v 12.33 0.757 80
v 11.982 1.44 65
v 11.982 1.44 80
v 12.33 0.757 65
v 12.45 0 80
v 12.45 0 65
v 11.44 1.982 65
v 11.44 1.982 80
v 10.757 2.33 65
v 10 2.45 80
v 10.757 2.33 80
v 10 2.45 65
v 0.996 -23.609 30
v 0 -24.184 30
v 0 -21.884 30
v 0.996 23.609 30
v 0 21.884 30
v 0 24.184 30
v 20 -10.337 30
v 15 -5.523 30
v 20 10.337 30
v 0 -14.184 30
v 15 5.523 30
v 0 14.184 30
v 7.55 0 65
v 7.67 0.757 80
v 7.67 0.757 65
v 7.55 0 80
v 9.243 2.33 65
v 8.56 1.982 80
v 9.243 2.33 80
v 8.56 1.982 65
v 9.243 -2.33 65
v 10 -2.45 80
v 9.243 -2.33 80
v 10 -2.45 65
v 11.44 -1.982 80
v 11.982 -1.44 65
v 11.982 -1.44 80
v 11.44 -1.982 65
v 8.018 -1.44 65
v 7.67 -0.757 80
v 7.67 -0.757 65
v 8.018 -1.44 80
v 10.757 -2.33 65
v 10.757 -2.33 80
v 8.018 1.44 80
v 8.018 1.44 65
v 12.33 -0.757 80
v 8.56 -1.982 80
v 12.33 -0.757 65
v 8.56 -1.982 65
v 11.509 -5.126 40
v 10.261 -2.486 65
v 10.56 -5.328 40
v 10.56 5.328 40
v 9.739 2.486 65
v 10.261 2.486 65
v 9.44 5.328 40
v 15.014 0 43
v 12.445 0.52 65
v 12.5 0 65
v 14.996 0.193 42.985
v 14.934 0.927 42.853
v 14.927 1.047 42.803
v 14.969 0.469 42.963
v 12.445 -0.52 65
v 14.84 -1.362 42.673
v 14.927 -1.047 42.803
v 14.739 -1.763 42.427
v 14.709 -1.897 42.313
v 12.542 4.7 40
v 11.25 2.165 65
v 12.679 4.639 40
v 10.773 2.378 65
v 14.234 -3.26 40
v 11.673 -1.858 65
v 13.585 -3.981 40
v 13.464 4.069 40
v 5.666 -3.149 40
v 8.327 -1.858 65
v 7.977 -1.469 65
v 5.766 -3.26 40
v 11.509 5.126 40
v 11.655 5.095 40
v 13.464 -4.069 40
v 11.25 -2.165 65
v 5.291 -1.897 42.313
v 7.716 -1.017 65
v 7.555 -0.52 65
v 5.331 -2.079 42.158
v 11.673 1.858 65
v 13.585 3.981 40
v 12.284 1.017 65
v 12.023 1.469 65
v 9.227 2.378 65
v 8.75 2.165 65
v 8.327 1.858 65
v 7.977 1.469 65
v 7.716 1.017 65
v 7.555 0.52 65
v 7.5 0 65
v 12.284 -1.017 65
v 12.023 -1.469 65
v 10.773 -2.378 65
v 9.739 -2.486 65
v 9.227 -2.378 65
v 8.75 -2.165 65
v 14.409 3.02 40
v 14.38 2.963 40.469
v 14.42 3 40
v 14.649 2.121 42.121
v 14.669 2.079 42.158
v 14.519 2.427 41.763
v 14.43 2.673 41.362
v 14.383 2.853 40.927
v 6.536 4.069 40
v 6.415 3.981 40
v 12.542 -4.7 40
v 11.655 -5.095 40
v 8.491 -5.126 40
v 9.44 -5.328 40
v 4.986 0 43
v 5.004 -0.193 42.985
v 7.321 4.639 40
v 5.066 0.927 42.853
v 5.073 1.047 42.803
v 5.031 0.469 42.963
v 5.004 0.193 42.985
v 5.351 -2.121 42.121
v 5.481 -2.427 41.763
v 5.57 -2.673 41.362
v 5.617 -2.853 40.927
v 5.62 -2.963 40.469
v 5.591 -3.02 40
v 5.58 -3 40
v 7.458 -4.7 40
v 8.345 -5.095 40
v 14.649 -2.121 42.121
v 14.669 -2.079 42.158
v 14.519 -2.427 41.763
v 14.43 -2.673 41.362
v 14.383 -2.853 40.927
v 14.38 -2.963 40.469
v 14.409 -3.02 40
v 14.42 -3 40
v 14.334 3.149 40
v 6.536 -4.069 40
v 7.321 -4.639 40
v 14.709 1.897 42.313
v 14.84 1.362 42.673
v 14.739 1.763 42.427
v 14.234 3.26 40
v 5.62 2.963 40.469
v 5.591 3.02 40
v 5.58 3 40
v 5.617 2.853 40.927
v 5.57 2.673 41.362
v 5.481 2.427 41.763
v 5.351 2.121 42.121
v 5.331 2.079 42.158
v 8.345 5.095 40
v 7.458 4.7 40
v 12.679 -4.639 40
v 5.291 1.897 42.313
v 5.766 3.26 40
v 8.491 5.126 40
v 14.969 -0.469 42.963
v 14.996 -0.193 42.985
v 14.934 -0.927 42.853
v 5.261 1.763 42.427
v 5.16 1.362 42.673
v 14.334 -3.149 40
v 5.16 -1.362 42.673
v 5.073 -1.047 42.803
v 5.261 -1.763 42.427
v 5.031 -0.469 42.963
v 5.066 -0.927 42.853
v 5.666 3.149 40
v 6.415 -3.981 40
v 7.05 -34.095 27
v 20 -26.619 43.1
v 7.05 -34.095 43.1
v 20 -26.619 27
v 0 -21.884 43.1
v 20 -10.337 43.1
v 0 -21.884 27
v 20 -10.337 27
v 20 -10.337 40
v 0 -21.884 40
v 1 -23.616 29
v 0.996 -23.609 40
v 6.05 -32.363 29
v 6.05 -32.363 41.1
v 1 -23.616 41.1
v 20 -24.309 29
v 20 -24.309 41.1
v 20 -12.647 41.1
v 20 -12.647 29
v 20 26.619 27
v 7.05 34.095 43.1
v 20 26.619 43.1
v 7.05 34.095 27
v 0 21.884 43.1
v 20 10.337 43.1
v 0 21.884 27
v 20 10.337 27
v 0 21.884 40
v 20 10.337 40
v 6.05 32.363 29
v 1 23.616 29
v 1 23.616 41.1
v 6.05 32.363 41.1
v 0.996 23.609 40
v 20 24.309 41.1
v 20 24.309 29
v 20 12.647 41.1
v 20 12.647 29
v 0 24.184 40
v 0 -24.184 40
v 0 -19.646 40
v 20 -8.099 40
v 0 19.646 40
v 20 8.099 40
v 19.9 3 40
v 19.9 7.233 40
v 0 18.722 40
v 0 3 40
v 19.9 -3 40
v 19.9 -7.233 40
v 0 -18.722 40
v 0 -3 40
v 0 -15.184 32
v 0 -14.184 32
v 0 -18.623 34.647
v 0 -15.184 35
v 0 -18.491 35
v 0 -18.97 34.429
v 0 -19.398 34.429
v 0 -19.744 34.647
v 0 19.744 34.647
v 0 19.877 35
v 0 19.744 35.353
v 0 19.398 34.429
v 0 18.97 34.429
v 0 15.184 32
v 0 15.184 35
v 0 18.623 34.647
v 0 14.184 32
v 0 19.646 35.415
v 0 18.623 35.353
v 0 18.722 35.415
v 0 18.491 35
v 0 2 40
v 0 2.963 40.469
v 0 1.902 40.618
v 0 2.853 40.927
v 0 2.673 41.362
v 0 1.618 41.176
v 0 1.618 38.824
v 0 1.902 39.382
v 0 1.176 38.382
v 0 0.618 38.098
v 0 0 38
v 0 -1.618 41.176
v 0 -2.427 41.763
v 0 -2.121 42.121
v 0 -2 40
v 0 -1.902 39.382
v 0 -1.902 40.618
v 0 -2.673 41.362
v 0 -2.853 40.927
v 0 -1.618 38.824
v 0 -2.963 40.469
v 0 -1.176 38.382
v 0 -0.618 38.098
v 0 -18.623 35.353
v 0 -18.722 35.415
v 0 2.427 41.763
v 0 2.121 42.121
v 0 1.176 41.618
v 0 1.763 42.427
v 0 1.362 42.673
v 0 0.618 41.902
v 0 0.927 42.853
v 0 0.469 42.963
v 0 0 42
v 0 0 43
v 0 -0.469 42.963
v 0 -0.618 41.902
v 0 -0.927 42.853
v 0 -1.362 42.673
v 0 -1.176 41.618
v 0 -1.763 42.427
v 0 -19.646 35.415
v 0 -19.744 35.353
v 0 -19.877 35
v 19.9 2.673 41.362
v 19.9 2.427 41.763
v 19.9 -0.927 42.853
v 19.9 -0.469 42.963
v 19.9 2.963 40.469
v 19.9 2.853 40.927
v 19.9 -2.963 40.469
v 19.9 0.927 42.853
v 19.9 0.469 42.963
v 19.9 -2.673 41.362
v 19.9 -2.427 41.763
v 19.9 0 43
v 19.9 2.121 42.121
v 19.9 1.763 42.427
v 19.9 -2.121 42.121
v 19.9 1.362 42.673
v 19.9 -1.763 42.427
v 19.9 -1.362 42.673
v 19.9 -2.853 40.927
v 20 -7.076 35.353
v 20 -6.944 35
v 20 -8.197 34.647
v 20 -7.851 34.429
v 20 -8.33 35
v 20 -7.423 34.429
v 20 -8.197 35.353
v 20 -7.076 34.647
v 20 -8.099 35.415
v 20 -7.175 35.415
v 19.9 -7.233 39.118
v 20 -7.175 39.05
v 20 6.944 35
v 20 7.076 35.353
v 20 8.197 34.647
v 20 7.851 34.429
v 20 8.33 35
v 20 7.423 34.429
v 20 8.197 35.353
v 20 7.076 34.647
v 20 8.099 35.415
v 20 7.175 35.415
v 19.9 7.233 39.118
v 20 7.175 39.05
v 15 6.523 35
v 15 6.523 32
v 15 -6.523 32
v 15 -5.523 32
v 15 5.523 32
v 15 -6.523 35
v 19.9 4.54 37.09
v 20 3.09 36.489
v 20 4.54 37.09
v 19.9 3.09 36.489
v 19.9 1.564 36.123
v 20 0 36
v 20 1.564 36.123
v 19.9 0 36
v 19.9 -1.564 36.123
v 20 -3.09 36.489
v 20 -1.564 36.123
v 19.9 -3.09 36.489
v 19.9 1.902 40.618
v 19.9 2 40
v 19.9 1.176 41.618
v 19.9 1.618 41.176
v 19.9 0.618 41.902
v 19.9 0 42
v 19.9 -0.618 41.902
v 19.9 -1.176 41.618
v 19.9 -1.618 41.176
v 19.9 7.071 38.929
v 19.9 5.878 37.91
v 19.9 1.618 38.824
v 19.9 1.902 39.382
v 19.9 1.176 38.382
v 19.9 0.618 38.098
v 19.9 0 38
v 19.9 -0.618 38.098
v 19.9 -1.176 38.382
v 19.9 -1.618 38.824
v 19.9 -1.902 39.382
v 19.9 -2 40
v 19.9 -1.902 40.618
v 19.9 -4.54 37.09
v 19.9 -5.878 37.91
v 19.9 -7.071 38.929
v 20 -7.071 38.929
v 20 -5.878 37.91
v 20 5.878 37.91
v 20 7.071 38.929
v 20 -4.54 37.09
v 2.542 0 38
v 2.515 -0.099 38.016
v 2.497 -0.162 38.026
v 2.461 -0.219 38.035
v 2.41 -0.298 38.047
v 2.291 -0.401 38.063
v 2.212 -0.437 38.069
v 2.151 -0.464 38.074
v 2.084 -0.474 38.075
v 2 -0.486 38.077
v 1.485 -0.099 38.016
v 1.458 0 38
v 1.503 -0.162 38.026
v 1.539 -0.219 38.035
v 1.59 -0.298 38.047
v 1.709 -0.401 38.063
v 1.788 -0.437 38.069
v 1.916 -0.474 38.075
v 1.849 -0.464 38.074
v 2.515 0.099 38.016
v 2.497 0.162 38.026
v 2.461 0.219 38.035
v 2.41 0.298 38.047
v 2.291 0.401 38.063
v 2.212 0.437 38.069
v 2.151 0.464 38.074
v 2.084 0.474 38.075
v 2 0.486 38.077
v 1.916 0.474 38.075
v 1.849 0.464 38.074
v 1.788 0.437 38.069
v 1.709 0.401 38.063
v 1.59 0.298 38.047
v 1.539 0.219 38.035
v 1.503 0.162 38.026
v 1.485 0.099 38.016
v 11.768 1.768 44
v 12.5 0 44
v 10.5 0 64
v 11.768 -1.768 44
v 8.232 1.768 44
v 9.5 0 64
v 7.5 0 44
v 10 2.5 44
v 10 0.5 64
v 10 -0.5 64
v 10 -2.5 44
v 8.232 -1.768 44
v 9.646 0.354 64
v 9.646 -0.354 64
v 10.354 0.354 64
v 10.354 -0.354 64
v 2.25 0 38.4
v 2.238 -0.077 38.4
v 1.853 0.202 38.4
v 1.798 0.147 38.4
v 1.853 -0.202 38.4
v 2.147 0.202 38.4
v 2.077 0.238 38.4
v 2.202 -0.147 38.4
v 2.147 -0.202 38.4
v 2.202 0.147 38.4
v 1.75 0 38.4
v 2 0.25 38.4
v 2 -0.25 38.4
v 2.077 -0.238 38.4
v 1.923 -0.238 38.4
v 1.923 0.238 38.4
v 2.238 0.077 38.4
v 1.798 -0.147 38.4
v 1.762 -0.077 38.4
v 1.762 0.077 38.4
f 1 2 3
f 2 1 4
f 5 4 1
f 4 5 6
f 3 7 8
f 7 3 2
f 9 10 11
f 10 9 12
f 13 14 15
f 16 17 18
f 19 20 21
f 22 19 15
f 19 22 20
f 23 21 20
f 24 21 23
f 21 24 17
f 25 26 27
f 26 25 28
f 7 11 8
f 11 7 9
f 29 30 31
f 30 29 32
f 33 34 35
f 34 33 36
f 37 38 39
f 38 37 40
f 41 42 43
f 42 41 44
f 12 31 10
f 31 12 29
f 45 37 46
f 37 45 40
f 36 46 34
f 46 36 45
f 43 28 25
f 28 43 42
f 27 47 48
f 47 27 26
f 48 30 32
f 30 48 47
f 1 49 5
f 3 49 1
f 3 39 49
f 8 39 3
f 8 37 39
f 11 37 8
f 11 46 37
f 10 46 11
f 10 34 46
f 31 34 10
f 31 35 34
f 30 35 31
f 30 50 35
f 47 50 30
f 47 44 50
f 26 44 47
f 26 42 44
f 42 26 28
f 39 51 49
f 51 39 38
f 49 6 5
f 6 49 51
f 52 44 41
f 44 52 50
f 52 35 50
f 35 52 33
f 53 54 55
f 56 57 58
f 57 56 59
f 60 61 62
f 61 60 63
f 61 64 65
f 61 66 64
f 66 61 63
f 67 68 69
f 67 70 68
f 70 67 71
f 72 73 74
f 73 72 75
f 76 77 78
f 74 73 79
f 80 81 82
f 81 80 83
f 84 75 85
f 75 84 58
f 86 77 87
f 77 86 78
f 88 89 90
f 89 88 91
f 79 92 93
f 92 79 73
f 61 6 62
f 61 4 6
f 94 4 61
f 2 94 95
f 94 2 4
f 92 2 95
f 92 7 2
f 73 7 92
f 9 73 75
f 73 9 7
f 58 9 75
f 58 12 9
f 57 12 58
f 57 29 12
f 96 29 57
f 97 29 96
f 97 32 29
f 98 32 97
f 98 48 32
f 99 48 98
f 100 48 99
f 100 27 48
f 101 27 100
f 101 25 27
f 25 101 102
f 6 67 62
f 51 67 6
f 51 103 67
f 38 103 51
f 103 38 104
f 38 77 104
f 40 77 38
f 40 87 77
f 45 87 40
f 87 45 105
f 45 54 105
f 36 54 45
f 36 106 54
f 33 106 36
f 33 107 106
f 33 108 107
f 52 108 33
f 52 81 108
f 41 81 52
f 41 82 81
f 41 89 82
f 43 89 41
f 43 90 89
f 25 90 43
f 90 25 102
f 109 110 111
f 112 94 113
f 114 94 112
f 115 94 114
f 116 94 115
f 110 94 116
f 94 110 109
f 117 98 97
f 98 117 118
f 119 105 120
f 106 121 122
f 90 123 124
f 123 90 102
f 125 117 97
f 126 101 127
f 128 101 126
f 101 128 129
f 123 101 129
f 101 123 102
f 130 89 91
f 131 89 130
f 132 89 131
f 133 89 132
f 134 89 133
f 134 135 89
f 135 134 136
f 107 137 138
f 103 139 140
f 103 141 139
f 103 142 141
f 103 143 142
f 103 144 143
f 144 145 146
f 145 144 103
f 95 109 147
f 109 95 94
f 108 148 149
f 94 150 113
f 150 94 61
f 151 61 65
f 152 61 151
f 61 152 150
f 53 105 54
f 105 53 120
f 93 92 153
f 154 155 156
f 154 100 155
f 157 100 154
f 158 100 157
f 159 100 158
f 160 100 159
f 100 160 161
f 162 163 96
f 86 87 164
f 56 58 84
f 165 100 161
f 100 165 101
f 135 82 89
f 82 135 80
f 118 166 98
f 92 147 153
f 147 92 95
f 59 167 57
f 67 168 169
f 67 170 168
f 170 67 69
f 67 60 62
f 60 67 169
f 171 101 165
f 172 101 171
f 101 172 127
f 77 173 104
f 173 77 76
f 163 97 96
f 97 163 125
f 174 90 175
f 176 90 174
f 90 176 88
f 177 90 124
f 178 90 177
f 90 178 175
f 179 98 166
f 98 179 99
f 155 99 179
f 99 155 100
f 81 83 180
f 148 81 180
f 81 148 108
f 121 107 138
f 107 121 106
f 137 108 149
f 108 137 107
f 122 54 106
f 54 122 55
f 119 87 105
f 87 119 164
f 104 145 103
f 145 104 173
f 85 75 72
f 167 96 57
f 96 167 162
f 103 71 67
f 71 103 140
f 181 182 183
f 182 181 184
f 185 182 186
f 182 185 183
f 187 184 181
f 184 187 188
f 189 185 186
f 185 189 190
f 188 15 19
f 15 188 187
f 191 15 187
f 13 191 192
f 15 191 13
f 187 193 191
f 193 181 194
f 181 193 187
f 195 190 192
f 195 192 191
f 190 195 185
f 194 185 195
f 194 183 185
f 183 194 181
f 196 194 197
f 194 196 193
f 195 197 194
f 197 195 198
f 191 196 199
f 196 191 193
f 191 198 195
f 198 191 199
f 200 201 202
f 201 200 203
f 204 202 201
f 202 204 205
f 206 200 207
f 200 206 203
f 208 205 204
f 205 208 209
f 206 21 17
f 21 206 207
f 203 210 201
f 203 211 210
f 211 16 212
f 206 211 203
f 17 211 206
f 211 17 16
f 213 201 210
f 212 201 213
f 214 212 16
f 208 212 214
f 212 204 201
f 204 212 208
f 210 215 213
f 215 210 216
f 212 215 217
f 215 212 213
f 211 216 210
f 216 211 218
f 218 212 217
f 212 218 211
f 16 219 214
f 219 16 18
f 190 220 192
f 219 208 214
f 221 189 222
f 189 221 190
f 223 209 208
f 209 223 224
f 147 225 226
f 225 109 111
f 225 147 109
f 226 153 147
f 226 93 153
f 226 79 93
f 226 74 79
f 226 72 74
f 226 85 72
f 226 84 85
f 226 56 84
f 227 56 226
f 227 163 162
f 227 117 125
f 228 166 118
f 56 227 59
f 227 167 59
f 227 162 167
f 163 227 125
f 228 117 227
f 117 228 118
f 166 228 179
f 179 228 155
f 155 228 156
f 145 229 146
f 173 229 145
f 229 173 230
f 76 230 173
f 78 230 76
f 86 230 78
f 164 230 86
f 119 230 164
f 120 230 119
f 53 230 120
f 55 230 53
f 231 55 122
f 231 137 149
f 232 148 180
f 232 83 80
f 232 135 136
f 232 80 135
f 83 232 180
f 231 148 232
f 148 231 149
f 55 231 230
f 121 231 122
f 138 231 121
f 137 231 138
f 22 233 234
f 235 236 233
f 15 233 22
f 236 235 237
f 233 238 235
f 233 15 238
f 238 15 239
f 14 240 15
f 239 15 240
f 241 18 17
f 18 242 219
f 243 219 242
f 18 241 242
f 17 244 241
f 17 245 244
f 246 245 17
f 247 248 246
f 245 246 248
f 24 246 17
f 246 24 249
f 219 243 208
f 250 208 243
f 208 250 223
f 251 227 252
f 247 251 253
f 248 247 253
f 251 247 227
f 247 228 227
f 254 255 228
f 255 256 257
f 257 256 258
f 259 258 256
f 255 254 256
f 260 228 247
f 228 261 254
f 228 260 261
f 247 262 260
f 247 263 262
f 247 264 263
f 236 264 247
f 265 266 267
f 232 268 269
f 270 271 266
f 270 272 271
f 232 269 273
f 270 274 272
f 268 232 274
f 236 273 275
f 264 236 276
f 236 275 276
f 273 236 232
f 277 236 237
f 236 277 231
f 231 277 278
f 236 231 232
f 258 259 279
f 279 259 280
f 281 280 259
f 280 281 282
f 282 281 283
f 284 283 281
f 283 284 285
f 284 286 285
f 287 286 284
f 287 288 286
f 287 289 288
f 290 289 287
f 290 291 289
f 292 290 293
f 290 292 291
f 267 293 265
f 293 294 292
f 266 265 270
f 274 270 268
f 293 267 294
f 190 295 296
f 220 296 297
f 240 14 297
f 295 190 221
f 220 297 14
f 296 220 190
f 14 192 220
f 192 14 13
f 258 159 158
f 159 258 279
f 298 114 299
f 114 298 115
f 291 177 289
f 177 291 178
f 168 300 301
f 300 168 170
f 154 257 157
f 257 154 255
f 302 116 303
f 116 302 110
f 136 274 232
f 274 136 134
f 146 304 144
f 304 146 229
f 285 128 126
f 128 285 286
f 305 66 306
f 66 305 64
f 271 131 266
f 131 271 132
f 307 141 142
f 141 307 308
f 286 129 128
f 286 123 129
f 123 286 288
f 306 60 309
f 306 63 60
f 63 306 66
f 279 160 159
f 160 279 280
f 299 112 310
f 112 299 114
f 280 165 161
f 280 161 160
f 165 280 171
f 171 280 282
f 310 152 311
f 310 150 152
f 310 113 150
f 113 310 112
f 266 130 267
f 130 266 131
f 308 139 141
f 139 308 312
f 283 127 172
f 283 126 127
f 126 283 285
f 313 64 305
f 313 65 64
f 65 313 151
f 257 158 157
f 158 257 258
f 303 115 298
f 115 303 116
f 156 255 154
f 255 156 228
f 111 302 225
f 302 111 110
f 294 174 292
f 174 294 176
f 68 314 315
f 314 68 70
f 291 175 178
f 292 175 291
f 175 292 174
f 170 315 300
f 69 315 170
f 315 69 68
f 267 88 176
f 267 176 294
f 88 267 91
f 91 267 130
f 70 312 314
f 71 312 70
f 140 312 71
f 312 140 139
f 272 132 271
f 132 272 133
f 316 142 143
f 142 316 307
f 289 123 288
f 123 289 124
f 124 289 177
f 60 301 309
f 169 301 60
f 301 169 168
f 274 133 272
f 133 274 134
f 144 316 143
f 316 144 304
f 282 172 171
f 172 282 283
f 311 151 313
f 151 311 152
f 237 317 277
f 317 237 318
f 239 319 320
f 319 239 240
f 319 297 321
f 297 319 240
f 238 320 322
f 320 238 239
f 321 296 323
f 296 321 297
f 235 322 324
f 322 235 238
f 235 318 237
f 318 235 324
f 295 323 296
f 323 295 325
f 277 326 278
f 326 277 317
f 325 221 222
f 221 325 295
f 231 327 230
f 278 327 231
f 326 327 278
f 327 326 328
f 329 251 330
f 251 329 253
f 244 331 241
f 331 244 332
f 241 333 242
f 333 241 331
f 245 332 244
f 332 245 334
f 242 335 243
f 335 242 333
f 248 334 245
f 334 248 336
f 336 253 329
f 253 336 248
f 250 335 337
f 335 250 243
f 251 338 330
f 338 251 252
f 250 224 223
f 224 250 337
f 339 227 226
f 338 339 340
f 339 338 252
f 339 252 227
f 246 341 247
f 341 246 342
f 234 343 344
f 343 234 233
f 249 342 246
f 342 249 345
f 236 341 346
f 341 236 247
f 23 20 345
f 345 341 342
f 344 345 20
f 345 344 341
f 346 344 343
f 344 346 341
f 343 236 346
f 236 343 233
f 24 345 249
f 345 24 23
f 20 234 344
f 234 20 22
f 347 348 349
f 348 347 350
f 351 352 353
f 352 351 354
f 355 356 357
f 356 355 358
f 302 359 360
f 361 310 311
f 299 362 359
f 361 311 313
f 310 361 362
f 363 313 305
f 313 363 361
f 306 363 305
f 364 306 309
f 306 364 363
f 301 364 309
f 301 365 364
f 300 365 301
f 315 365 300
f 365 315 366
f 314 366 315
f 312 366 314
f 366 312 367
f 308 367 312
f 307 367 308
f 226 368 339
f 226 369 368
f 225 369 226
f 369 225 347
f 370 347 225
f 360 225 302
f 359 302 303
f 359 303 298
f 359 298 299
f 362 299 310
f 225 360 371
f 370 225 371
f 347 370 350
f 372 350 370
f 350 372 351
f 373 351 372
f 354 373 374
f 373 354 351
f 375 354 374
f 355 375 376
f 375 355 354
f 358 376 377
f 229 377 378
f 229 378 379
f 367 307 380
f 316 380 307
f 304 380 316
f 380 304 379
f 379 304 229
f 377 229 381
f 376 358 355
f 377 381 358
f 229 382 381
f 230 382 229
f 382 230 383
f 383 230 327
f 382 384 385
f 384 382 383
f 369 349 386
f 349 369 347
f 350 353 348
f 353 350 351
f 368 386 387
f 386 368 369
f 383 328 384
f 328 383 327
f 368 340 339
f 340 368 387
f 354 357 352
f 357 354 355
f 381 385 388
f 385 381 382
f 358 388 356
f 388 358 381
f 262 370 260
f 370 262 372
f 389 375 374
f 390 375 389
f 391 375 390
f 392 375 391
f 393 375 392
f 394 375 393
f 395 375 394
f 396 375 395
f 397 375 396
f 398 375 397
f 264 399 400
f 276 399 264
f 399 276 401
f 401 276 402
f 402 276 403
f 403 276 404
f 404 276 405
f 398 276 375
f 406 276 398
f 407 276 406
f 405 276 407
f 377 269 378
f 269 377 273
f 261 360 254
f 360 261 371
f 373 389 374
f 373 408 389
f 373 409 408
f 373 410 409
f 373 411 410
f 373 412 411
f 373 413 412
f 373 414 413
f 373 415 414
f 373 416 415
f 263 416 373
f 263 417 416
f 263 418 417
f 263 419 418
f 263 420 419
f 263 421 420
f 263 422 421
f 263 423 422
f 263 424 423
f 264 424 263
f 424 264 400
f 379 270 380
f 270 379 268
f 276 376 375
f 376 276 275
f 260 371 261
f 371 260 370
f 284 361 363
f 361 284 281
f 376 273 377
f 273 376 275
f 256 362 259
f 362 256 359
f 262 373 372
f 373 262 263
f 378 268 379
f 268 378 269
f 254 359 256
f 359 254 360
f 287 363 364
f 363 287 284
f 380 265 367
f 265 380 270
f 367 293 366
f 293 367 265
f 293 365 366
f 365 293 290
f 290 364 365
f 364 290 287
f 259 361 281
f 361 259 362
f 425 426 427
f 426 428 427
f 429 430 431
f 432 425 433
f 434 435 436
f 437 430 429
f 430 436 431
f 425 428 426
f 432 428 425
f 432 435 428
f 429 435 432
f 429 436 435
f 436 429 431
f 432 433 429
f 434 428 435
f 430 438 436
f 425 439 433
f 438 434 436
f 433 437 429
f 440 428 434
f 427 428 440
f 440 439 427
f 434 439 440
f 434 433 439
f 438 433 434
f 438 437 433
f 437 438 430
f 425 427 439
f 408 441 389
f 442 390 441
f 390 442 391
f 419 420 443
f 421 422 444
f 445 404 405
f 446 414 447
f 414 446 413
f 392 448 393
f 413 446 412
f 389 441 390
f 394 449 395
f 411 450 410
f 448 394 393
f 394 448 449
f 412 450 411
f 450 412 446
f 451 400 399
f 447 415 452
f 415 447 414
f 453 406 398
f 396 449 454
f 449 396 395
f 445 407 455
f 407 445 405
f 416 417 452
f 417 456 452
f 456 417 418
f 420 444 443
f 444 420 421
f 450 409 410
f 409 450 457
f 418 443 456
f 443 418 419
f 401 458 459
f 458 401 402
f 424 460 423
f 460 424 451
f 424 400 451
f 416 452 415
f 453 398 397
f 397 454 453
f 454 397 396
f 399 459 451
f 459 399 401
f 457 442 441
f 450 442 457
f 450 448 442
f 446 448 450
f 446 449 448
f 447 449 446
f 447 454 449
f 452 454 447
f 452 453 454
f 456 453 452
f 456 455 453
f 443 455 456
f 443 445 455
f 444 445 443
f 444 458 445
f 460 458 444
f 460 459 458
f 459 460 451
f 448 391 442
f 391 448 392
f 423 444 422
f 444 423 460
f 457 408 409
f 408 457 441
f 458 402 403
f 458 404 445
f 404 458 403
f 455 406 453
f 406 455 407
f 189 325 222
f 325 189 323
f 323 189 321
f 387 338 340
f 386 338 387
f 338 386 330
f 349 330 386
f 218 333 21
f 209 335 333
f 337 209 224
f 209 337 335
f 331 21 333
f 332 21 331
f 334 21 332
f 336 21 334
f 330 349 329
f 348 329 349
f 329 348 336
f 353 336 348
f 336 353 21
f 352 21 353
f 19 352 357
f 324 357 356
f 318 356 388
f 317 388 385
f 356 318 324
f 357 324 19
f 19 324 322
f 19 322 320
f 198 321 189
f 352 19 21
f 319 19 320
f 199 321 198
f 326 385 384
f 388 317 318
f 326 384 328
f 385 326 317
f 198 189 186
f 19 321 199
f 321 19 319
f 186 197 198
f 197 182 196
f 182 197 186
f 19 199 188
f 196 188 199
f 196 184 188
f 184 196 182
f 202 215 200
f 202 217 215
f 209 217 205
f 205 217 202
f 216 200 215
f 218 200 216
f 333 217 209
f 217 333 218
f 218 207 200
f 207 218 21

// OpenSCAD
module slidingSlot(){
	difference(){
		rotate_extrude(){
			translate([40,0,0])
			polygon(points=[[0,0],[16,0],[16,10],[11,10],[11,7],[13,4],[13,3],[3,3],[3,4],[5,7],[5,10],[0,10]]);
		}
		translate([0,0,-5])
		linear_extrude(height=20)
		polygon(points=[[60,60],[-60,60],[0,0],[-60,-60],[60,-60]]);
	}
}

module needleSlot(xx,yy,zz){
	l=55;
	translate([xx-(l-5)*cos(30)+25,yy-sin(30)*l-2.25,zz+5])
		rotate([-90,0,-60]){
			cylinder(d=1.2,h=l,$fn=10);
			translate([-0.4,-10,0])
				cube([0.8,10,l]);
	}
}

module sideMotorMount(xx,yy,zz,wideY){
	translate([xx,-wideY+(2/cos(30))-0.01,zz-3])
		rotate([0,0,-60]){
		difference(){
			cube([14.1,24,16.1]);
			translate([2,-5,2])
			cube([10.1,30,12.1]);
		}
	}
}

module signature(){
	translate([17,6,39.5])
	rotate([0,0,150])
	scale([2,2,1])
	linear_extrude(height=2)
		import(file="sig.dxf");
}


module waterNeedleHolder(xx,yy,zz){
	narrowY=2.25+sin(30)*5+5;
	wideY=narrowY+tan(30)*25;
	
	difference(){
		union(){

			//Top Scaffold Adaptor
			translate([10,0,zz]){
				cylinder(d=4.9,h=50,$fn=20);
				cylinder(d1=13,d2=5,h=35, $fn=30);
			}
		
			//Base
			translate([xx,yy,zz])
			linear_extrude(height=10)
			polygon(points=[[25,narrowY],[25,-narrowY],[0,-wideY],[0,wideY]]);

			//Odor Tube
			translate([xx,yy,zz+10])
			rotate([0,90,0])	
			cylinder(h=20,d=6,$fn=40);
			
			sideMotorMount(xx,yy,zz,wideY);
			mirror([0,1,0])
				sideMotorMount(xx,yy,zz,wideY);

		}

		signature();
		
		//Bottom Slot
		translate([xx,yy,zz+2])
		linear_extrude(height=3)
		polygon(points=[[15,tan(30)*10+narrowY-9],[15,-tan(30)*10-narrowY+9],[0,-wideY+9],[0,wideY-9]]);
		
		//Bottom Groove
		translate([xx,yy,zz-5])
		linear_extrude(height=10)
		polygon(points=[[15,tan(30)*10+narrowY-10],[15,-tan(30)*10-narrowY+10],[0,-wideY+10],[0,wideY-10]]);

		
		//Nose Groove
		translate([xx+19.9,yy,zz+16])
		rotate([0,90,0])
		cylinder(h=20,d=20,$fn=40);
		
		
		//Odor Tube
		translate([xx-15,yy,zz+10])
		rotate([0,90,0])
		cylinder(h=60,d=4,$fn=20);

		needleSlot(xx,yy,zz);
		mirror([0,1,0]) needleSlot(xx,yy,zz);
		
		//hole in adaptor
		translate([10,0,zz+14])
		cylinder(h=20,d1=5,d2=1);
		
	}
	
	//Odor Tube Fixer
	translate([2,0,zz+6]){
		cylinder(d1=4,d2=0.5,h=2.4,$fn=20);
	}
}

// module measureCube(){
	// translate([29,-2.25,0])
	// cube([20,4.5,4.5]);
// }


// module functionColumn(){
	
// }

module mousePlatform(){
	translate([0,-100,0])
	color("grey",1.0){
		cube([200,200,10]);
		translate([60,50,0])
		cube([20,100,20]);
	}
	translate([50,0,37.5])
	rotate([0,90,0])
	{
		difference(){	
			difference(){
				color("white",0.7){
					cylinder(d=45,h=150);
				}
				translate([0,0,-10])
				cylinder(d=35,h=170);
			}
			translate([-30,-50,-10])
			cube([20,100,170]);
		}
	}
}


// mousePlatform();
// translate([70,0,20])
// slidingSlot();
if (1) difference(){
	waterNeedleHolder(0,0,30);
	translate([20,-50,0])cube([100,100,100]);
}else difference(){
	waterNeedleHolder(0,0,30);
	translate([-80,-50,0])cube([100,100,100]);
}
// signature();

//measureCube();
